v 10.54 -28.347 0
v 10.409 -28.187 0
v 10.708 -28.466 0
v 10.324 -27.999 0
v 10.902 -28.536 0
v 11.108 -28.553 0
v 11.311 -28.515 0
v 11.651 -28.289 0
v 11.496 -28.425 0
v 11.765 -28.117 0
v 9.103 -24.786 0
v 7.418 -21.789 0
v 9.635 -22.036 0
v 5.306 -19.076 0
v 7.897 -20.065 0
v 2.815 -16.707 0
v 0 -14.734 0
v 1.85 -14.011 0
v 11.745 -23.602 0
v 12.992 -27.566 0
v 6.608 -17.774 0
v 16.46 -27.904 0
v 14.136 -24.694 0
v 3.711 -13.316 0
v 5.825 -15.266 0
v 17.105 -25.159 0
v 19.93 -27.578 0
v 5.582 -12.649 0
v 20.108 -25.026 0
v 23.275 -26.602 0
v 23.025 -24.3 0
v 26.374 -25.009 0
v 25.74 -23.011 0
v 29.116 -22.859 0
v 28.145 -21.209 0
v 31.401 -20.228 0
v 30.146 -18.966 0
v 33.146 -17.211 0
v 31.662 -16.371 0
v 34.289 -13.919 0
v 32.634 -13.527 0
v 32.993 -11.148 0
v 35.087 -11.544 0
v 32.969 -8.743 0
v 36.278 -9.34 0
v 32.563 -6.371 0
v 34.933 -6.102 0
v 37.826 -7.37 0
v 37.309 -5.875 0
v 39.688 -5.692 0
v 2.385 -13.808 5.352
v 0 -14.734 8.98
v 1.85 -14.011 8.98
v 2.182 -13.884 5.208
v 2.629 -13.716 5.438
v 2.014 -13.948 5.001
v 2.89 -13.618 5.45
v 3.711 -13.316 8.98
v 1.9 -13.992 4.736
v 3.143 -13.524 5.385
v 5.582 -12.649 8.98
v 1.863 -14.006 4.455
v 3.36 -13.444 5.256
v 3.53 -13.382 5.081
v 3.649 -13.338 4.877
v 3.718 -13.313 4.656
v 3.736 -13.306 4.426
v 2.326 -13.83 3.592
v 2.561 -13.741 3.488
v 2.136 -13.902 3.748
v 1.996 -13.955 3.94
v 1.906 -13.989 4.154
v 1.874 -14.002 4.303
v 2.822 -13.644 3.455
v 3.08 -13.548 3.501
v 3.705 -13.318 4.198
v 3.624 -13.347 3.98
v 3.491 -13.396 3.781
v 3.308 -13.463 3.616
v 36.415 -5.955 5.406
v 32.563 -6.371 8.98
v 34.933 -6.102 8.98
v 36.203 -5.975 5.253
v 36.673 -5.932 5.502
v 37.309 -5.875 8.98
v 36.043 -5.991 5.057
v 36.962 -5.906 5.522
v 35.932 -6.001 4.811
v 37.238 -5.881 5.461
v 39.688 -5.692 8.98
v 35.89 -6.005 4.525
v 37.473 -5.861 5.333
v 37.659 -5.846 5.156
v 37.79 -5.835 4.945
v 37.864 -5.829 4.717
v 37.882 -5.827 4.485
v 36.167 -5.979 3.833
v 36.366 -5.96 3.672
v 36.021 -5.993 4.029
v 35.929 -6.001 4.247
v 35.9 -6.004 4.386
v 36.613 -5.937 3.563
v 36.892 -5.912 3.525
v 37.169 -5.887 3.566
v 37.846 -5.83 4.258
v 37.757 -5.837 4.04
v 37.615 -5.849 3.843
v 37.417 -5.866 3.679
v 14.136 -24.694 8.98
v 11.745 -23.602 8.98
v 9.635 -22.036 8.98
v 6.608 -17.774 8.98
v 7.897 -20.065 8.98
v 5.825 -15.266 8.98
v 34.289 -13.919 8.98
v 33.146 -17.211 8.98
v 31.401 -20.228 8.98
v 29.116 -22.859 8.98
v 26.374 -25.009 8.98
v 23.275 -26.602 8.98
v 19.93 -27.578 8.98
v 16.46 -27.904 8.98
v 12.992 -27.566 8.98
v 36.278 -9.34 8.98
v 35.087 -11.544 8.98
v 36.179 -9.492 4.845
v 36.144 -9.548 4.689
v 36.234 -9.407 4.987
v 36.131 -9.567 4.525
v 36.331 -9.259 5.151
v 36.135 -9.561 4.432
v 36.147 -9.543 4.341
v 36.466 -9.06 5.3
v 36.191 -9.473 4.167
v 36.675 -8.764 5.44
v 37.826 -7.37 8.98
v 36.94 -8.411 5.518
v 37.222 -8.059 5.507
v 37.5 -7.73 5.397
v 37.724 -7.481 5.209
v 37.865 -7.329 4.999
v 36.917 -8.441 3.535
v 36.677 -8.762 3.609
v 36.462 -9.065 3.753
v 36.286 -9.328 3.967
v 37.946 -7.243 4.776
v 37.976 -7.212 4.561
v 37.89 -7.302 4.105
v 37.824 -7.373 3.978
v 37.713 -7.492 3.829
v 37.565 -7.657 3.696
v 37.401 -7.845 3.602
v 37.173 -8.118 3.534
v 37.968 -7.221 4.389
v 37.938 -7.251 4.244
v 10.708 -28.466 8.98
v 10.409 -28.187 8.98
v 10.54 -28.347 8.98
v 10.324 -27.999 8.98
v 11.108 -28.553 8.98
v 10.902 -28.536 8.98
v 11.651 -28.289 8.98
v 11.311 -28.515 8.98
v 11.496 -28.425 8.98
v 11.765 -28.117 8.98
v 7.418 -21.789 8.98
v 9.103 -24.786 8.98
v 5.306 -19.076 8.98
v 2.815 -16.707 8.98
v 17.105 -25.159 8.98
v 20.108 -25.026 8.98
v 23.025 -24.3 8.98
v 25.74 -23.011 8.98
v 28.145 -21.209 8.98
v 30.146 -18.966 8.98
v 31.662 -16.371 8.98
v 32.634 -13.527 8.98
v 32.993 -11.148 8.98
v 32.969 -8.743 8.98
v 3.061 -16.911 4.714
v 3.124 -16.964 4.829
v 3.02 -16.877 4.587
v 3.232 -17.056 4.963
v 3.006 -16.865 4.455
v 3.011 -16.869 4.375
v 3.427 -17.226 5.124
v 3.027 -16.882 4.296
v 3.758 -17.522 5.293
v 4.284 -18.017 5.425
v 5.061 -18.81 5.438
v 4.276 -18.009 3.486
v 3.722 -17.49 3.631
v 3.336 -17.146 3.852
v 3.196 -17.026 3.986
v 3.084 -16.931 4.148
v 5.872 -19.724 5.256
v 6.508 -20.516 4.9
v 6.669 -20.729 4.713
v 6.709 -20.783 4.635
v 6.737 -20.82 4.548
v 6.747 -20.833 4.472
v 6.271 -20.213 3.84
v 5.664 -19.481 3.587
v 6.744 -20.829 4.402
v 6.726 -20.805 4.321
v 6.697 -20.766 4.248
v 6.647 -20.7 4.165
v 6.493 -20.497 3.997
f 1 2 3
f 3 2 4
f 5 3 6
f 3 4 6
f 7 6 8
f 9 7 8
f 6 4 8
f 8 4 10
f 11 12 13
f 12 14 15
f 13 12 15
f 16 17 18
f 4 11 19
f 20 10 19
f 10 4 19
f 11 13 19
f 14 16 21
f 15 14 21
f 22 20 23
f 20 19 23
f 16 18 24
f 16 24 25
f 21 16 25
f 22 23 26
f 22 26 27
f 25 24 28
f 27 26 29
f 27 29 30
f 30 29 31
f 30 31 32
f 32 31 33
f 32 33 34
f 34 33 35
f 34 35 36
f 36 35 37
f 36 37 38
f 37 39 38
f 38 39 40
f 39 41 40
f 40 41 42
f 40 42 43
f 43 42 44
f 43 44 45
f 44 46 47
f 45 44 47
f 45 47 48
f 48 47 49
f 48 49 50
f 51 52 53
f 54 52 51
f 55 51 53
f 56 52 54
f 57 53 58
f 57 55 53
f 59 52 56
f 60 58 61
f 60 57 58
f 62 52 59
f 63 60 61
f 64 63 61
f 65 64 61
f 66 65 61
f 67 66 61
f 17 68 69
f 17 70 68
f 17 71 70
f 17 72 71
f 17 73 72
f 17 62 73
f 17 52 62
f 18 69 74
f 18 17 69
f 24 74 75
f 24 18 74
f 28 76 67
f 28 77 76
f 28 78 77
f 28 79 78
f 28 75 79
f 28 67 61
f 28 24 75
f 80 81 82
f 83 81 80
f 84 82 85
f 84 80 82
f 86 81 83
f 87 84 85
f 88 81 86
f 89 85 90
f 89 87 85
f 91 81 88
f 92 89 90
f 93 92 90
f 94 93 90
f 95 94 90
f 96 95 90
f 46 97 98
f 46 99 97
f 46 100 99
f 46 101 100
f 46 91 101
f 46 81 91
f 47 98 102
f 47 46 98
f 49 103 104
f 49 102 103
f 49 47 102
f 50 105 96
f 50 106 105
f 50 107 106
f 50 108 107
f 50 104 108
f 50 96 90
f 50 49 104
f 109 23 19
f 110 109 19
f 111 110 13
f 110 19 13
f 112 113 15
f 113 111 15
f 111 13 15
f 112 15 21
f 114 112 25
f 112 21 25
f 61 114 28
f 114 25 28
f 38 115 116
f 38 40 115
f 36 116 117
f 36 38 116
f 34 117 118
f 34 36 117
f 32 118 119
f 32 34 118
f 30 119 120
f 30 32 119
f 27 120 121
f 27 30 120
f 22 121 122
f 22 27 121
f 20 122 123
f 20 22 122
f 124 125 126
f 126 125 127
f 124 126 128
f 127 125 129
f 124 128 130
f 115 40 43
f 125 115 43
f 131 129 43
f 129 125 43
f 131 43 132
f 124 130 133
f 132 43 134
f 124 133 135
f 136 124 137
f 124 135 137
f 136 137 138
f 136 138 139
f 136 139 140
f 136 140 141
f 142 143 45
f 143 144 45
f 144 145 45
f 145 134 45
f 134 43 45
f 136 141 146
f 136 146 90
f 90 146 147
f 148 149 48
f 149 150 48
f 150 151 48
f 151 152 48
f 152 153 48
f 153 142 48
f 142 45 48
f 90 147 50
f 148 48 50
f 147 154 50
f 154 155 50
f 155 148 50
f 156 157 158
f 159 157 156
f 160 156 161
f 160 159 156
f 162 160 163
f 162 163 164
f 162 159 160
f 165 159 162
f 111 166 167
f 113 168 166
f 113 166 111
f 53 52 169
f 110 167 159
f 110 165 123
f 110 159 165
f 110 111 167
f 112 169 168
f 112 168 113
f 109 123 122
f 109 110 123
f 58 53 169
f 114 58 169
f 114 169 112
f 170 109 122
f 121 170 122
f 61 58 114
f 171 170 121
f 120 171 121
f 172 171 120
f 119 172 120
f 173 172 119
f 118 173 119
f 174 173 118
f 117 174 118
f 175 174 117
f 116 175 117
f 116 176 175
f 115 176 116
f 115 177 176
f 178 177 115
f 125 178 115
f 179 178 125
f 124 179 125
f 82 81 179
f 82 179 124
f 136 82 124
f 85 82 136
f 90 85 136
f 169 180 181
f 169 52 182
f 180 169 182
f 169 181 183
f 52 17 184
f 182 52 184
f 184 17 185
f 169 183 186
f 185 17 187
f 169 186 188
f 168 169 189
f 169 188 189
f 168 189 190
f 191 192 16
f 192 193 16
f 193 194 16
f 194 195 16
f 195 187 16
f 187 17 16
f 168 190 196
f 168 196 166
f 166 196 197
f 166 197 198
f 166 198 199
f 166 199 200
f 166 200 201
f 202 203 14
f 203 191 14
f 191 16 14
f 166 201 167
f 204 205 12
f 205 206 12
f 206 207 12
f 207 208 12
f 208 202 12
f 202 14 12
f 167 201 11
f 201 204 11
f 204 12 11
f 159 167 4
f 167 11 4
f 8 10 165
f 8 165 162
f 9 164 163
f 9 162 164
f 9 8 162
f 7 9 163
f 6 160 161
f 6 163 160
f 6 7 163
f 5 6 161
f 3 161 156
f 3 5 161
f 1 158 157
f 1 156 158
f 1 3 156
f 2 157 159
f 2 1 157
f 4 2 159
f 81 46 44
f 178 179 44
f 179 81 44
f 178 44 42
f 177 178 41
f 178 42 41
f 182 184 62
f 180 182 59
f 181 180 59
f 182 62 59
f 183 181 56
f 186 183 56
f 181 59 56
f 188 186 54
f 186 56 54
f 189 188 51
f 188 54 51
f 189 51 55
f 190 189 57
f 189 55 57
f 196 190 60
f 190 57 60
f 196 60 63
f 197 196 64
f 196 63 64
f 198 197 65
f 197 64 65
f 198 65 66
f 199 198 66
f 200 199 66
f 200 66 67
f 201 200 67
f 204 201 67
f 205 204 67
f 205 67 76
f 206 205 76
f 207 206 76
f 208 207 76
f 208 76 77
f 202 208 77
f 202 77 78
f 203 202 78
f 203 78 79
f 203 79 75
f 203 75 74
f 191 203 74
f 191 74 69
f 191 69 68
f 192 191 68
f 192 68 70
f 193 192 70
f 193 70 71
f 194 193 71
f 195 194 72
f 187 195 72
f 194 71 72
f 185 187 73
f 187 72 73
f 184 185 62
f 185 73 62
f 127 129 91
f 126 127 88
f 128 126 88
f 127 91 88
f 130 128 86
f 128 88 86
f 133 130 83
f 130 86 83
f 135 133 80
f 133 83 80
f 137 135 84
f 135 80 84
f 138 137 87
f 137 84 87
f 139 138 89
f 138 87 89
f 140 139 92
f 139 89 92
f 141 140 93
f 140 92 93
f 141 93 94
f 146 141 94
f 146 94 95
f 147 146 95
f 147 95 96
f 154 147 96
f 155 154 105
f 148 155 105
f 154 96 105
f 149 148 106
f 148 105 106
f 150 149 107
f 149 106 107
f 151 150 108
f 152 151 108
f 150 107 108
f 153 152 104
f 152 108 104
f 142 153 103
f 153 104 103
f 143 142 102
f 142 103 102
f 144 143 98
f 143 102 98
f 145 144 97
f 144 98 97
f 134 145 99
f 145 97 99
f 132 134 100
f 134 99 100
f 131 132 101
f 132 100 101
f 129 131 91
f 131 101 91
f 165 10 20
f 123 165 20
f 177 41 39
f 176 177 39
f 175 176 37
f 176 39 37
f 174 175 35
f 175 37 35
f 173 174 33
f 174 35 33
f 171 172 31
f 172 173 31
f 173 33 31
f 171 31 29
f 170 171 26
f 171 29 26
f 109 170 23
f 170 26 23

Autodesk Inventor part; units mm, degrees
ref_plane "YZ Plane" through (0, 0, 0) normal (1, 0, 0) x (0, 1, 0)
sketch "Sketch1" plane through (0, 0, 0) normal (0, 0, 1) x (1, 0, 0)
  arc A0 (10.3242, -27.9992) -> (11.7654, -28.1173) centre (11.0677, -27.7785) ccw
  line L0 (11.7654, -28.1173) -> (12.9919, -27.5665)
  arc A1 (12.9919, -27.5665) -> (34.2886, -13.9193) centre (16.4917, -9.5875) ccw
  arc A2 (10.3242, -27.9992) -> (0, -14.7343) centre (-11.7995, -34.5682) ccw
  arc A3 (5.5815, -12.6488) -> (14.136, -24.6939) centre (18.1207, -12.8036) ccw
  arc A4 (32.6339, -13.5274) -> (32.5628, -6.3713) centre (17.9412, -10.0948) ccw
  arc A5 (39.6875, -5.6924) -> (34.2886, -13.9193) centre (48.5431, -17.3889) ccw
  arc A6 (5.5815, -12.6488) -> (0, -14.7343) centre (48.5171, -136.0683) ccw
  arc A7 (39.6875, -5.6924) -> (32.5628, -6.3713) centre (48.5171, -136.0683) ccw
  arc A8 (14.136, -24.6939) -> (32.6339, -13.5274) centre (17.9429, -10.0956) ccw
  point P0 (0, 0)
extrude "Extrusion1" add sketch "Sketch1" along normal blind 8.98
ref_plane "Work Plane1" through (39.6875, -5.6924, 0) normal (-0.0676, 0.9977, 0) x (-0.9977, -0.0676, 0)
sketch "Sketch2" plane through (39.6875, -5.6924, 0) normal (-0.0676, 0.9977, 0) x (-0.9977, -0.0676, 0)
  circle A0 centre (2.81, 4.525) radius 1
  line L0 (7.1542, 0) -> (0, 0) projected
  line L1 (0, 0) -> (0, 8.98) projected
  point P0 (39.2122, 0)
  dimension "d2" = 2
  dimension "d15" = 4.525
  dimension "d16" = 2.81
extrude "Extrusion2" cut sketch "Sketch2" against normal through all
thread "Thread1" size "M2x0.4" class "6H" standard "ANSI Metric M Profile" full length
ref_plane "Work Plane2" through (0, -14.7343, 0) normal (-0.3713, 0.9285, 0) x (-0.9285, -0.3713, 0)
sketch "Sketch3" plane through (0, -14.7343, 0) normal (-0.3713, 0.9285, 0) x (-0.9285, -0.3713, 0)
  circle A0 centre (-3, 4.455) radius 1
  line L0 (0, 0) -> (0, 8.98) projected
  line L1 (0, 8.98) -> (-5.9568, 8.98) projected
  line L2 (0, 0) -> (-5.9568, 0) projected
  point P0 (-5.4706, 0)
  dimension "d7" = 2
  dimension "d12" = 3
  dimension "d13" = 4.525
  dimension "d14" = 8.98
extrude "Extrusion3" cut sketch "Sketch3" against normal through all
thread "Thread2" size "M2x0.4" class "6H" standard "ANSI Metric M Profile" full length
properties material "Liga de Nickel-Copper 400"
